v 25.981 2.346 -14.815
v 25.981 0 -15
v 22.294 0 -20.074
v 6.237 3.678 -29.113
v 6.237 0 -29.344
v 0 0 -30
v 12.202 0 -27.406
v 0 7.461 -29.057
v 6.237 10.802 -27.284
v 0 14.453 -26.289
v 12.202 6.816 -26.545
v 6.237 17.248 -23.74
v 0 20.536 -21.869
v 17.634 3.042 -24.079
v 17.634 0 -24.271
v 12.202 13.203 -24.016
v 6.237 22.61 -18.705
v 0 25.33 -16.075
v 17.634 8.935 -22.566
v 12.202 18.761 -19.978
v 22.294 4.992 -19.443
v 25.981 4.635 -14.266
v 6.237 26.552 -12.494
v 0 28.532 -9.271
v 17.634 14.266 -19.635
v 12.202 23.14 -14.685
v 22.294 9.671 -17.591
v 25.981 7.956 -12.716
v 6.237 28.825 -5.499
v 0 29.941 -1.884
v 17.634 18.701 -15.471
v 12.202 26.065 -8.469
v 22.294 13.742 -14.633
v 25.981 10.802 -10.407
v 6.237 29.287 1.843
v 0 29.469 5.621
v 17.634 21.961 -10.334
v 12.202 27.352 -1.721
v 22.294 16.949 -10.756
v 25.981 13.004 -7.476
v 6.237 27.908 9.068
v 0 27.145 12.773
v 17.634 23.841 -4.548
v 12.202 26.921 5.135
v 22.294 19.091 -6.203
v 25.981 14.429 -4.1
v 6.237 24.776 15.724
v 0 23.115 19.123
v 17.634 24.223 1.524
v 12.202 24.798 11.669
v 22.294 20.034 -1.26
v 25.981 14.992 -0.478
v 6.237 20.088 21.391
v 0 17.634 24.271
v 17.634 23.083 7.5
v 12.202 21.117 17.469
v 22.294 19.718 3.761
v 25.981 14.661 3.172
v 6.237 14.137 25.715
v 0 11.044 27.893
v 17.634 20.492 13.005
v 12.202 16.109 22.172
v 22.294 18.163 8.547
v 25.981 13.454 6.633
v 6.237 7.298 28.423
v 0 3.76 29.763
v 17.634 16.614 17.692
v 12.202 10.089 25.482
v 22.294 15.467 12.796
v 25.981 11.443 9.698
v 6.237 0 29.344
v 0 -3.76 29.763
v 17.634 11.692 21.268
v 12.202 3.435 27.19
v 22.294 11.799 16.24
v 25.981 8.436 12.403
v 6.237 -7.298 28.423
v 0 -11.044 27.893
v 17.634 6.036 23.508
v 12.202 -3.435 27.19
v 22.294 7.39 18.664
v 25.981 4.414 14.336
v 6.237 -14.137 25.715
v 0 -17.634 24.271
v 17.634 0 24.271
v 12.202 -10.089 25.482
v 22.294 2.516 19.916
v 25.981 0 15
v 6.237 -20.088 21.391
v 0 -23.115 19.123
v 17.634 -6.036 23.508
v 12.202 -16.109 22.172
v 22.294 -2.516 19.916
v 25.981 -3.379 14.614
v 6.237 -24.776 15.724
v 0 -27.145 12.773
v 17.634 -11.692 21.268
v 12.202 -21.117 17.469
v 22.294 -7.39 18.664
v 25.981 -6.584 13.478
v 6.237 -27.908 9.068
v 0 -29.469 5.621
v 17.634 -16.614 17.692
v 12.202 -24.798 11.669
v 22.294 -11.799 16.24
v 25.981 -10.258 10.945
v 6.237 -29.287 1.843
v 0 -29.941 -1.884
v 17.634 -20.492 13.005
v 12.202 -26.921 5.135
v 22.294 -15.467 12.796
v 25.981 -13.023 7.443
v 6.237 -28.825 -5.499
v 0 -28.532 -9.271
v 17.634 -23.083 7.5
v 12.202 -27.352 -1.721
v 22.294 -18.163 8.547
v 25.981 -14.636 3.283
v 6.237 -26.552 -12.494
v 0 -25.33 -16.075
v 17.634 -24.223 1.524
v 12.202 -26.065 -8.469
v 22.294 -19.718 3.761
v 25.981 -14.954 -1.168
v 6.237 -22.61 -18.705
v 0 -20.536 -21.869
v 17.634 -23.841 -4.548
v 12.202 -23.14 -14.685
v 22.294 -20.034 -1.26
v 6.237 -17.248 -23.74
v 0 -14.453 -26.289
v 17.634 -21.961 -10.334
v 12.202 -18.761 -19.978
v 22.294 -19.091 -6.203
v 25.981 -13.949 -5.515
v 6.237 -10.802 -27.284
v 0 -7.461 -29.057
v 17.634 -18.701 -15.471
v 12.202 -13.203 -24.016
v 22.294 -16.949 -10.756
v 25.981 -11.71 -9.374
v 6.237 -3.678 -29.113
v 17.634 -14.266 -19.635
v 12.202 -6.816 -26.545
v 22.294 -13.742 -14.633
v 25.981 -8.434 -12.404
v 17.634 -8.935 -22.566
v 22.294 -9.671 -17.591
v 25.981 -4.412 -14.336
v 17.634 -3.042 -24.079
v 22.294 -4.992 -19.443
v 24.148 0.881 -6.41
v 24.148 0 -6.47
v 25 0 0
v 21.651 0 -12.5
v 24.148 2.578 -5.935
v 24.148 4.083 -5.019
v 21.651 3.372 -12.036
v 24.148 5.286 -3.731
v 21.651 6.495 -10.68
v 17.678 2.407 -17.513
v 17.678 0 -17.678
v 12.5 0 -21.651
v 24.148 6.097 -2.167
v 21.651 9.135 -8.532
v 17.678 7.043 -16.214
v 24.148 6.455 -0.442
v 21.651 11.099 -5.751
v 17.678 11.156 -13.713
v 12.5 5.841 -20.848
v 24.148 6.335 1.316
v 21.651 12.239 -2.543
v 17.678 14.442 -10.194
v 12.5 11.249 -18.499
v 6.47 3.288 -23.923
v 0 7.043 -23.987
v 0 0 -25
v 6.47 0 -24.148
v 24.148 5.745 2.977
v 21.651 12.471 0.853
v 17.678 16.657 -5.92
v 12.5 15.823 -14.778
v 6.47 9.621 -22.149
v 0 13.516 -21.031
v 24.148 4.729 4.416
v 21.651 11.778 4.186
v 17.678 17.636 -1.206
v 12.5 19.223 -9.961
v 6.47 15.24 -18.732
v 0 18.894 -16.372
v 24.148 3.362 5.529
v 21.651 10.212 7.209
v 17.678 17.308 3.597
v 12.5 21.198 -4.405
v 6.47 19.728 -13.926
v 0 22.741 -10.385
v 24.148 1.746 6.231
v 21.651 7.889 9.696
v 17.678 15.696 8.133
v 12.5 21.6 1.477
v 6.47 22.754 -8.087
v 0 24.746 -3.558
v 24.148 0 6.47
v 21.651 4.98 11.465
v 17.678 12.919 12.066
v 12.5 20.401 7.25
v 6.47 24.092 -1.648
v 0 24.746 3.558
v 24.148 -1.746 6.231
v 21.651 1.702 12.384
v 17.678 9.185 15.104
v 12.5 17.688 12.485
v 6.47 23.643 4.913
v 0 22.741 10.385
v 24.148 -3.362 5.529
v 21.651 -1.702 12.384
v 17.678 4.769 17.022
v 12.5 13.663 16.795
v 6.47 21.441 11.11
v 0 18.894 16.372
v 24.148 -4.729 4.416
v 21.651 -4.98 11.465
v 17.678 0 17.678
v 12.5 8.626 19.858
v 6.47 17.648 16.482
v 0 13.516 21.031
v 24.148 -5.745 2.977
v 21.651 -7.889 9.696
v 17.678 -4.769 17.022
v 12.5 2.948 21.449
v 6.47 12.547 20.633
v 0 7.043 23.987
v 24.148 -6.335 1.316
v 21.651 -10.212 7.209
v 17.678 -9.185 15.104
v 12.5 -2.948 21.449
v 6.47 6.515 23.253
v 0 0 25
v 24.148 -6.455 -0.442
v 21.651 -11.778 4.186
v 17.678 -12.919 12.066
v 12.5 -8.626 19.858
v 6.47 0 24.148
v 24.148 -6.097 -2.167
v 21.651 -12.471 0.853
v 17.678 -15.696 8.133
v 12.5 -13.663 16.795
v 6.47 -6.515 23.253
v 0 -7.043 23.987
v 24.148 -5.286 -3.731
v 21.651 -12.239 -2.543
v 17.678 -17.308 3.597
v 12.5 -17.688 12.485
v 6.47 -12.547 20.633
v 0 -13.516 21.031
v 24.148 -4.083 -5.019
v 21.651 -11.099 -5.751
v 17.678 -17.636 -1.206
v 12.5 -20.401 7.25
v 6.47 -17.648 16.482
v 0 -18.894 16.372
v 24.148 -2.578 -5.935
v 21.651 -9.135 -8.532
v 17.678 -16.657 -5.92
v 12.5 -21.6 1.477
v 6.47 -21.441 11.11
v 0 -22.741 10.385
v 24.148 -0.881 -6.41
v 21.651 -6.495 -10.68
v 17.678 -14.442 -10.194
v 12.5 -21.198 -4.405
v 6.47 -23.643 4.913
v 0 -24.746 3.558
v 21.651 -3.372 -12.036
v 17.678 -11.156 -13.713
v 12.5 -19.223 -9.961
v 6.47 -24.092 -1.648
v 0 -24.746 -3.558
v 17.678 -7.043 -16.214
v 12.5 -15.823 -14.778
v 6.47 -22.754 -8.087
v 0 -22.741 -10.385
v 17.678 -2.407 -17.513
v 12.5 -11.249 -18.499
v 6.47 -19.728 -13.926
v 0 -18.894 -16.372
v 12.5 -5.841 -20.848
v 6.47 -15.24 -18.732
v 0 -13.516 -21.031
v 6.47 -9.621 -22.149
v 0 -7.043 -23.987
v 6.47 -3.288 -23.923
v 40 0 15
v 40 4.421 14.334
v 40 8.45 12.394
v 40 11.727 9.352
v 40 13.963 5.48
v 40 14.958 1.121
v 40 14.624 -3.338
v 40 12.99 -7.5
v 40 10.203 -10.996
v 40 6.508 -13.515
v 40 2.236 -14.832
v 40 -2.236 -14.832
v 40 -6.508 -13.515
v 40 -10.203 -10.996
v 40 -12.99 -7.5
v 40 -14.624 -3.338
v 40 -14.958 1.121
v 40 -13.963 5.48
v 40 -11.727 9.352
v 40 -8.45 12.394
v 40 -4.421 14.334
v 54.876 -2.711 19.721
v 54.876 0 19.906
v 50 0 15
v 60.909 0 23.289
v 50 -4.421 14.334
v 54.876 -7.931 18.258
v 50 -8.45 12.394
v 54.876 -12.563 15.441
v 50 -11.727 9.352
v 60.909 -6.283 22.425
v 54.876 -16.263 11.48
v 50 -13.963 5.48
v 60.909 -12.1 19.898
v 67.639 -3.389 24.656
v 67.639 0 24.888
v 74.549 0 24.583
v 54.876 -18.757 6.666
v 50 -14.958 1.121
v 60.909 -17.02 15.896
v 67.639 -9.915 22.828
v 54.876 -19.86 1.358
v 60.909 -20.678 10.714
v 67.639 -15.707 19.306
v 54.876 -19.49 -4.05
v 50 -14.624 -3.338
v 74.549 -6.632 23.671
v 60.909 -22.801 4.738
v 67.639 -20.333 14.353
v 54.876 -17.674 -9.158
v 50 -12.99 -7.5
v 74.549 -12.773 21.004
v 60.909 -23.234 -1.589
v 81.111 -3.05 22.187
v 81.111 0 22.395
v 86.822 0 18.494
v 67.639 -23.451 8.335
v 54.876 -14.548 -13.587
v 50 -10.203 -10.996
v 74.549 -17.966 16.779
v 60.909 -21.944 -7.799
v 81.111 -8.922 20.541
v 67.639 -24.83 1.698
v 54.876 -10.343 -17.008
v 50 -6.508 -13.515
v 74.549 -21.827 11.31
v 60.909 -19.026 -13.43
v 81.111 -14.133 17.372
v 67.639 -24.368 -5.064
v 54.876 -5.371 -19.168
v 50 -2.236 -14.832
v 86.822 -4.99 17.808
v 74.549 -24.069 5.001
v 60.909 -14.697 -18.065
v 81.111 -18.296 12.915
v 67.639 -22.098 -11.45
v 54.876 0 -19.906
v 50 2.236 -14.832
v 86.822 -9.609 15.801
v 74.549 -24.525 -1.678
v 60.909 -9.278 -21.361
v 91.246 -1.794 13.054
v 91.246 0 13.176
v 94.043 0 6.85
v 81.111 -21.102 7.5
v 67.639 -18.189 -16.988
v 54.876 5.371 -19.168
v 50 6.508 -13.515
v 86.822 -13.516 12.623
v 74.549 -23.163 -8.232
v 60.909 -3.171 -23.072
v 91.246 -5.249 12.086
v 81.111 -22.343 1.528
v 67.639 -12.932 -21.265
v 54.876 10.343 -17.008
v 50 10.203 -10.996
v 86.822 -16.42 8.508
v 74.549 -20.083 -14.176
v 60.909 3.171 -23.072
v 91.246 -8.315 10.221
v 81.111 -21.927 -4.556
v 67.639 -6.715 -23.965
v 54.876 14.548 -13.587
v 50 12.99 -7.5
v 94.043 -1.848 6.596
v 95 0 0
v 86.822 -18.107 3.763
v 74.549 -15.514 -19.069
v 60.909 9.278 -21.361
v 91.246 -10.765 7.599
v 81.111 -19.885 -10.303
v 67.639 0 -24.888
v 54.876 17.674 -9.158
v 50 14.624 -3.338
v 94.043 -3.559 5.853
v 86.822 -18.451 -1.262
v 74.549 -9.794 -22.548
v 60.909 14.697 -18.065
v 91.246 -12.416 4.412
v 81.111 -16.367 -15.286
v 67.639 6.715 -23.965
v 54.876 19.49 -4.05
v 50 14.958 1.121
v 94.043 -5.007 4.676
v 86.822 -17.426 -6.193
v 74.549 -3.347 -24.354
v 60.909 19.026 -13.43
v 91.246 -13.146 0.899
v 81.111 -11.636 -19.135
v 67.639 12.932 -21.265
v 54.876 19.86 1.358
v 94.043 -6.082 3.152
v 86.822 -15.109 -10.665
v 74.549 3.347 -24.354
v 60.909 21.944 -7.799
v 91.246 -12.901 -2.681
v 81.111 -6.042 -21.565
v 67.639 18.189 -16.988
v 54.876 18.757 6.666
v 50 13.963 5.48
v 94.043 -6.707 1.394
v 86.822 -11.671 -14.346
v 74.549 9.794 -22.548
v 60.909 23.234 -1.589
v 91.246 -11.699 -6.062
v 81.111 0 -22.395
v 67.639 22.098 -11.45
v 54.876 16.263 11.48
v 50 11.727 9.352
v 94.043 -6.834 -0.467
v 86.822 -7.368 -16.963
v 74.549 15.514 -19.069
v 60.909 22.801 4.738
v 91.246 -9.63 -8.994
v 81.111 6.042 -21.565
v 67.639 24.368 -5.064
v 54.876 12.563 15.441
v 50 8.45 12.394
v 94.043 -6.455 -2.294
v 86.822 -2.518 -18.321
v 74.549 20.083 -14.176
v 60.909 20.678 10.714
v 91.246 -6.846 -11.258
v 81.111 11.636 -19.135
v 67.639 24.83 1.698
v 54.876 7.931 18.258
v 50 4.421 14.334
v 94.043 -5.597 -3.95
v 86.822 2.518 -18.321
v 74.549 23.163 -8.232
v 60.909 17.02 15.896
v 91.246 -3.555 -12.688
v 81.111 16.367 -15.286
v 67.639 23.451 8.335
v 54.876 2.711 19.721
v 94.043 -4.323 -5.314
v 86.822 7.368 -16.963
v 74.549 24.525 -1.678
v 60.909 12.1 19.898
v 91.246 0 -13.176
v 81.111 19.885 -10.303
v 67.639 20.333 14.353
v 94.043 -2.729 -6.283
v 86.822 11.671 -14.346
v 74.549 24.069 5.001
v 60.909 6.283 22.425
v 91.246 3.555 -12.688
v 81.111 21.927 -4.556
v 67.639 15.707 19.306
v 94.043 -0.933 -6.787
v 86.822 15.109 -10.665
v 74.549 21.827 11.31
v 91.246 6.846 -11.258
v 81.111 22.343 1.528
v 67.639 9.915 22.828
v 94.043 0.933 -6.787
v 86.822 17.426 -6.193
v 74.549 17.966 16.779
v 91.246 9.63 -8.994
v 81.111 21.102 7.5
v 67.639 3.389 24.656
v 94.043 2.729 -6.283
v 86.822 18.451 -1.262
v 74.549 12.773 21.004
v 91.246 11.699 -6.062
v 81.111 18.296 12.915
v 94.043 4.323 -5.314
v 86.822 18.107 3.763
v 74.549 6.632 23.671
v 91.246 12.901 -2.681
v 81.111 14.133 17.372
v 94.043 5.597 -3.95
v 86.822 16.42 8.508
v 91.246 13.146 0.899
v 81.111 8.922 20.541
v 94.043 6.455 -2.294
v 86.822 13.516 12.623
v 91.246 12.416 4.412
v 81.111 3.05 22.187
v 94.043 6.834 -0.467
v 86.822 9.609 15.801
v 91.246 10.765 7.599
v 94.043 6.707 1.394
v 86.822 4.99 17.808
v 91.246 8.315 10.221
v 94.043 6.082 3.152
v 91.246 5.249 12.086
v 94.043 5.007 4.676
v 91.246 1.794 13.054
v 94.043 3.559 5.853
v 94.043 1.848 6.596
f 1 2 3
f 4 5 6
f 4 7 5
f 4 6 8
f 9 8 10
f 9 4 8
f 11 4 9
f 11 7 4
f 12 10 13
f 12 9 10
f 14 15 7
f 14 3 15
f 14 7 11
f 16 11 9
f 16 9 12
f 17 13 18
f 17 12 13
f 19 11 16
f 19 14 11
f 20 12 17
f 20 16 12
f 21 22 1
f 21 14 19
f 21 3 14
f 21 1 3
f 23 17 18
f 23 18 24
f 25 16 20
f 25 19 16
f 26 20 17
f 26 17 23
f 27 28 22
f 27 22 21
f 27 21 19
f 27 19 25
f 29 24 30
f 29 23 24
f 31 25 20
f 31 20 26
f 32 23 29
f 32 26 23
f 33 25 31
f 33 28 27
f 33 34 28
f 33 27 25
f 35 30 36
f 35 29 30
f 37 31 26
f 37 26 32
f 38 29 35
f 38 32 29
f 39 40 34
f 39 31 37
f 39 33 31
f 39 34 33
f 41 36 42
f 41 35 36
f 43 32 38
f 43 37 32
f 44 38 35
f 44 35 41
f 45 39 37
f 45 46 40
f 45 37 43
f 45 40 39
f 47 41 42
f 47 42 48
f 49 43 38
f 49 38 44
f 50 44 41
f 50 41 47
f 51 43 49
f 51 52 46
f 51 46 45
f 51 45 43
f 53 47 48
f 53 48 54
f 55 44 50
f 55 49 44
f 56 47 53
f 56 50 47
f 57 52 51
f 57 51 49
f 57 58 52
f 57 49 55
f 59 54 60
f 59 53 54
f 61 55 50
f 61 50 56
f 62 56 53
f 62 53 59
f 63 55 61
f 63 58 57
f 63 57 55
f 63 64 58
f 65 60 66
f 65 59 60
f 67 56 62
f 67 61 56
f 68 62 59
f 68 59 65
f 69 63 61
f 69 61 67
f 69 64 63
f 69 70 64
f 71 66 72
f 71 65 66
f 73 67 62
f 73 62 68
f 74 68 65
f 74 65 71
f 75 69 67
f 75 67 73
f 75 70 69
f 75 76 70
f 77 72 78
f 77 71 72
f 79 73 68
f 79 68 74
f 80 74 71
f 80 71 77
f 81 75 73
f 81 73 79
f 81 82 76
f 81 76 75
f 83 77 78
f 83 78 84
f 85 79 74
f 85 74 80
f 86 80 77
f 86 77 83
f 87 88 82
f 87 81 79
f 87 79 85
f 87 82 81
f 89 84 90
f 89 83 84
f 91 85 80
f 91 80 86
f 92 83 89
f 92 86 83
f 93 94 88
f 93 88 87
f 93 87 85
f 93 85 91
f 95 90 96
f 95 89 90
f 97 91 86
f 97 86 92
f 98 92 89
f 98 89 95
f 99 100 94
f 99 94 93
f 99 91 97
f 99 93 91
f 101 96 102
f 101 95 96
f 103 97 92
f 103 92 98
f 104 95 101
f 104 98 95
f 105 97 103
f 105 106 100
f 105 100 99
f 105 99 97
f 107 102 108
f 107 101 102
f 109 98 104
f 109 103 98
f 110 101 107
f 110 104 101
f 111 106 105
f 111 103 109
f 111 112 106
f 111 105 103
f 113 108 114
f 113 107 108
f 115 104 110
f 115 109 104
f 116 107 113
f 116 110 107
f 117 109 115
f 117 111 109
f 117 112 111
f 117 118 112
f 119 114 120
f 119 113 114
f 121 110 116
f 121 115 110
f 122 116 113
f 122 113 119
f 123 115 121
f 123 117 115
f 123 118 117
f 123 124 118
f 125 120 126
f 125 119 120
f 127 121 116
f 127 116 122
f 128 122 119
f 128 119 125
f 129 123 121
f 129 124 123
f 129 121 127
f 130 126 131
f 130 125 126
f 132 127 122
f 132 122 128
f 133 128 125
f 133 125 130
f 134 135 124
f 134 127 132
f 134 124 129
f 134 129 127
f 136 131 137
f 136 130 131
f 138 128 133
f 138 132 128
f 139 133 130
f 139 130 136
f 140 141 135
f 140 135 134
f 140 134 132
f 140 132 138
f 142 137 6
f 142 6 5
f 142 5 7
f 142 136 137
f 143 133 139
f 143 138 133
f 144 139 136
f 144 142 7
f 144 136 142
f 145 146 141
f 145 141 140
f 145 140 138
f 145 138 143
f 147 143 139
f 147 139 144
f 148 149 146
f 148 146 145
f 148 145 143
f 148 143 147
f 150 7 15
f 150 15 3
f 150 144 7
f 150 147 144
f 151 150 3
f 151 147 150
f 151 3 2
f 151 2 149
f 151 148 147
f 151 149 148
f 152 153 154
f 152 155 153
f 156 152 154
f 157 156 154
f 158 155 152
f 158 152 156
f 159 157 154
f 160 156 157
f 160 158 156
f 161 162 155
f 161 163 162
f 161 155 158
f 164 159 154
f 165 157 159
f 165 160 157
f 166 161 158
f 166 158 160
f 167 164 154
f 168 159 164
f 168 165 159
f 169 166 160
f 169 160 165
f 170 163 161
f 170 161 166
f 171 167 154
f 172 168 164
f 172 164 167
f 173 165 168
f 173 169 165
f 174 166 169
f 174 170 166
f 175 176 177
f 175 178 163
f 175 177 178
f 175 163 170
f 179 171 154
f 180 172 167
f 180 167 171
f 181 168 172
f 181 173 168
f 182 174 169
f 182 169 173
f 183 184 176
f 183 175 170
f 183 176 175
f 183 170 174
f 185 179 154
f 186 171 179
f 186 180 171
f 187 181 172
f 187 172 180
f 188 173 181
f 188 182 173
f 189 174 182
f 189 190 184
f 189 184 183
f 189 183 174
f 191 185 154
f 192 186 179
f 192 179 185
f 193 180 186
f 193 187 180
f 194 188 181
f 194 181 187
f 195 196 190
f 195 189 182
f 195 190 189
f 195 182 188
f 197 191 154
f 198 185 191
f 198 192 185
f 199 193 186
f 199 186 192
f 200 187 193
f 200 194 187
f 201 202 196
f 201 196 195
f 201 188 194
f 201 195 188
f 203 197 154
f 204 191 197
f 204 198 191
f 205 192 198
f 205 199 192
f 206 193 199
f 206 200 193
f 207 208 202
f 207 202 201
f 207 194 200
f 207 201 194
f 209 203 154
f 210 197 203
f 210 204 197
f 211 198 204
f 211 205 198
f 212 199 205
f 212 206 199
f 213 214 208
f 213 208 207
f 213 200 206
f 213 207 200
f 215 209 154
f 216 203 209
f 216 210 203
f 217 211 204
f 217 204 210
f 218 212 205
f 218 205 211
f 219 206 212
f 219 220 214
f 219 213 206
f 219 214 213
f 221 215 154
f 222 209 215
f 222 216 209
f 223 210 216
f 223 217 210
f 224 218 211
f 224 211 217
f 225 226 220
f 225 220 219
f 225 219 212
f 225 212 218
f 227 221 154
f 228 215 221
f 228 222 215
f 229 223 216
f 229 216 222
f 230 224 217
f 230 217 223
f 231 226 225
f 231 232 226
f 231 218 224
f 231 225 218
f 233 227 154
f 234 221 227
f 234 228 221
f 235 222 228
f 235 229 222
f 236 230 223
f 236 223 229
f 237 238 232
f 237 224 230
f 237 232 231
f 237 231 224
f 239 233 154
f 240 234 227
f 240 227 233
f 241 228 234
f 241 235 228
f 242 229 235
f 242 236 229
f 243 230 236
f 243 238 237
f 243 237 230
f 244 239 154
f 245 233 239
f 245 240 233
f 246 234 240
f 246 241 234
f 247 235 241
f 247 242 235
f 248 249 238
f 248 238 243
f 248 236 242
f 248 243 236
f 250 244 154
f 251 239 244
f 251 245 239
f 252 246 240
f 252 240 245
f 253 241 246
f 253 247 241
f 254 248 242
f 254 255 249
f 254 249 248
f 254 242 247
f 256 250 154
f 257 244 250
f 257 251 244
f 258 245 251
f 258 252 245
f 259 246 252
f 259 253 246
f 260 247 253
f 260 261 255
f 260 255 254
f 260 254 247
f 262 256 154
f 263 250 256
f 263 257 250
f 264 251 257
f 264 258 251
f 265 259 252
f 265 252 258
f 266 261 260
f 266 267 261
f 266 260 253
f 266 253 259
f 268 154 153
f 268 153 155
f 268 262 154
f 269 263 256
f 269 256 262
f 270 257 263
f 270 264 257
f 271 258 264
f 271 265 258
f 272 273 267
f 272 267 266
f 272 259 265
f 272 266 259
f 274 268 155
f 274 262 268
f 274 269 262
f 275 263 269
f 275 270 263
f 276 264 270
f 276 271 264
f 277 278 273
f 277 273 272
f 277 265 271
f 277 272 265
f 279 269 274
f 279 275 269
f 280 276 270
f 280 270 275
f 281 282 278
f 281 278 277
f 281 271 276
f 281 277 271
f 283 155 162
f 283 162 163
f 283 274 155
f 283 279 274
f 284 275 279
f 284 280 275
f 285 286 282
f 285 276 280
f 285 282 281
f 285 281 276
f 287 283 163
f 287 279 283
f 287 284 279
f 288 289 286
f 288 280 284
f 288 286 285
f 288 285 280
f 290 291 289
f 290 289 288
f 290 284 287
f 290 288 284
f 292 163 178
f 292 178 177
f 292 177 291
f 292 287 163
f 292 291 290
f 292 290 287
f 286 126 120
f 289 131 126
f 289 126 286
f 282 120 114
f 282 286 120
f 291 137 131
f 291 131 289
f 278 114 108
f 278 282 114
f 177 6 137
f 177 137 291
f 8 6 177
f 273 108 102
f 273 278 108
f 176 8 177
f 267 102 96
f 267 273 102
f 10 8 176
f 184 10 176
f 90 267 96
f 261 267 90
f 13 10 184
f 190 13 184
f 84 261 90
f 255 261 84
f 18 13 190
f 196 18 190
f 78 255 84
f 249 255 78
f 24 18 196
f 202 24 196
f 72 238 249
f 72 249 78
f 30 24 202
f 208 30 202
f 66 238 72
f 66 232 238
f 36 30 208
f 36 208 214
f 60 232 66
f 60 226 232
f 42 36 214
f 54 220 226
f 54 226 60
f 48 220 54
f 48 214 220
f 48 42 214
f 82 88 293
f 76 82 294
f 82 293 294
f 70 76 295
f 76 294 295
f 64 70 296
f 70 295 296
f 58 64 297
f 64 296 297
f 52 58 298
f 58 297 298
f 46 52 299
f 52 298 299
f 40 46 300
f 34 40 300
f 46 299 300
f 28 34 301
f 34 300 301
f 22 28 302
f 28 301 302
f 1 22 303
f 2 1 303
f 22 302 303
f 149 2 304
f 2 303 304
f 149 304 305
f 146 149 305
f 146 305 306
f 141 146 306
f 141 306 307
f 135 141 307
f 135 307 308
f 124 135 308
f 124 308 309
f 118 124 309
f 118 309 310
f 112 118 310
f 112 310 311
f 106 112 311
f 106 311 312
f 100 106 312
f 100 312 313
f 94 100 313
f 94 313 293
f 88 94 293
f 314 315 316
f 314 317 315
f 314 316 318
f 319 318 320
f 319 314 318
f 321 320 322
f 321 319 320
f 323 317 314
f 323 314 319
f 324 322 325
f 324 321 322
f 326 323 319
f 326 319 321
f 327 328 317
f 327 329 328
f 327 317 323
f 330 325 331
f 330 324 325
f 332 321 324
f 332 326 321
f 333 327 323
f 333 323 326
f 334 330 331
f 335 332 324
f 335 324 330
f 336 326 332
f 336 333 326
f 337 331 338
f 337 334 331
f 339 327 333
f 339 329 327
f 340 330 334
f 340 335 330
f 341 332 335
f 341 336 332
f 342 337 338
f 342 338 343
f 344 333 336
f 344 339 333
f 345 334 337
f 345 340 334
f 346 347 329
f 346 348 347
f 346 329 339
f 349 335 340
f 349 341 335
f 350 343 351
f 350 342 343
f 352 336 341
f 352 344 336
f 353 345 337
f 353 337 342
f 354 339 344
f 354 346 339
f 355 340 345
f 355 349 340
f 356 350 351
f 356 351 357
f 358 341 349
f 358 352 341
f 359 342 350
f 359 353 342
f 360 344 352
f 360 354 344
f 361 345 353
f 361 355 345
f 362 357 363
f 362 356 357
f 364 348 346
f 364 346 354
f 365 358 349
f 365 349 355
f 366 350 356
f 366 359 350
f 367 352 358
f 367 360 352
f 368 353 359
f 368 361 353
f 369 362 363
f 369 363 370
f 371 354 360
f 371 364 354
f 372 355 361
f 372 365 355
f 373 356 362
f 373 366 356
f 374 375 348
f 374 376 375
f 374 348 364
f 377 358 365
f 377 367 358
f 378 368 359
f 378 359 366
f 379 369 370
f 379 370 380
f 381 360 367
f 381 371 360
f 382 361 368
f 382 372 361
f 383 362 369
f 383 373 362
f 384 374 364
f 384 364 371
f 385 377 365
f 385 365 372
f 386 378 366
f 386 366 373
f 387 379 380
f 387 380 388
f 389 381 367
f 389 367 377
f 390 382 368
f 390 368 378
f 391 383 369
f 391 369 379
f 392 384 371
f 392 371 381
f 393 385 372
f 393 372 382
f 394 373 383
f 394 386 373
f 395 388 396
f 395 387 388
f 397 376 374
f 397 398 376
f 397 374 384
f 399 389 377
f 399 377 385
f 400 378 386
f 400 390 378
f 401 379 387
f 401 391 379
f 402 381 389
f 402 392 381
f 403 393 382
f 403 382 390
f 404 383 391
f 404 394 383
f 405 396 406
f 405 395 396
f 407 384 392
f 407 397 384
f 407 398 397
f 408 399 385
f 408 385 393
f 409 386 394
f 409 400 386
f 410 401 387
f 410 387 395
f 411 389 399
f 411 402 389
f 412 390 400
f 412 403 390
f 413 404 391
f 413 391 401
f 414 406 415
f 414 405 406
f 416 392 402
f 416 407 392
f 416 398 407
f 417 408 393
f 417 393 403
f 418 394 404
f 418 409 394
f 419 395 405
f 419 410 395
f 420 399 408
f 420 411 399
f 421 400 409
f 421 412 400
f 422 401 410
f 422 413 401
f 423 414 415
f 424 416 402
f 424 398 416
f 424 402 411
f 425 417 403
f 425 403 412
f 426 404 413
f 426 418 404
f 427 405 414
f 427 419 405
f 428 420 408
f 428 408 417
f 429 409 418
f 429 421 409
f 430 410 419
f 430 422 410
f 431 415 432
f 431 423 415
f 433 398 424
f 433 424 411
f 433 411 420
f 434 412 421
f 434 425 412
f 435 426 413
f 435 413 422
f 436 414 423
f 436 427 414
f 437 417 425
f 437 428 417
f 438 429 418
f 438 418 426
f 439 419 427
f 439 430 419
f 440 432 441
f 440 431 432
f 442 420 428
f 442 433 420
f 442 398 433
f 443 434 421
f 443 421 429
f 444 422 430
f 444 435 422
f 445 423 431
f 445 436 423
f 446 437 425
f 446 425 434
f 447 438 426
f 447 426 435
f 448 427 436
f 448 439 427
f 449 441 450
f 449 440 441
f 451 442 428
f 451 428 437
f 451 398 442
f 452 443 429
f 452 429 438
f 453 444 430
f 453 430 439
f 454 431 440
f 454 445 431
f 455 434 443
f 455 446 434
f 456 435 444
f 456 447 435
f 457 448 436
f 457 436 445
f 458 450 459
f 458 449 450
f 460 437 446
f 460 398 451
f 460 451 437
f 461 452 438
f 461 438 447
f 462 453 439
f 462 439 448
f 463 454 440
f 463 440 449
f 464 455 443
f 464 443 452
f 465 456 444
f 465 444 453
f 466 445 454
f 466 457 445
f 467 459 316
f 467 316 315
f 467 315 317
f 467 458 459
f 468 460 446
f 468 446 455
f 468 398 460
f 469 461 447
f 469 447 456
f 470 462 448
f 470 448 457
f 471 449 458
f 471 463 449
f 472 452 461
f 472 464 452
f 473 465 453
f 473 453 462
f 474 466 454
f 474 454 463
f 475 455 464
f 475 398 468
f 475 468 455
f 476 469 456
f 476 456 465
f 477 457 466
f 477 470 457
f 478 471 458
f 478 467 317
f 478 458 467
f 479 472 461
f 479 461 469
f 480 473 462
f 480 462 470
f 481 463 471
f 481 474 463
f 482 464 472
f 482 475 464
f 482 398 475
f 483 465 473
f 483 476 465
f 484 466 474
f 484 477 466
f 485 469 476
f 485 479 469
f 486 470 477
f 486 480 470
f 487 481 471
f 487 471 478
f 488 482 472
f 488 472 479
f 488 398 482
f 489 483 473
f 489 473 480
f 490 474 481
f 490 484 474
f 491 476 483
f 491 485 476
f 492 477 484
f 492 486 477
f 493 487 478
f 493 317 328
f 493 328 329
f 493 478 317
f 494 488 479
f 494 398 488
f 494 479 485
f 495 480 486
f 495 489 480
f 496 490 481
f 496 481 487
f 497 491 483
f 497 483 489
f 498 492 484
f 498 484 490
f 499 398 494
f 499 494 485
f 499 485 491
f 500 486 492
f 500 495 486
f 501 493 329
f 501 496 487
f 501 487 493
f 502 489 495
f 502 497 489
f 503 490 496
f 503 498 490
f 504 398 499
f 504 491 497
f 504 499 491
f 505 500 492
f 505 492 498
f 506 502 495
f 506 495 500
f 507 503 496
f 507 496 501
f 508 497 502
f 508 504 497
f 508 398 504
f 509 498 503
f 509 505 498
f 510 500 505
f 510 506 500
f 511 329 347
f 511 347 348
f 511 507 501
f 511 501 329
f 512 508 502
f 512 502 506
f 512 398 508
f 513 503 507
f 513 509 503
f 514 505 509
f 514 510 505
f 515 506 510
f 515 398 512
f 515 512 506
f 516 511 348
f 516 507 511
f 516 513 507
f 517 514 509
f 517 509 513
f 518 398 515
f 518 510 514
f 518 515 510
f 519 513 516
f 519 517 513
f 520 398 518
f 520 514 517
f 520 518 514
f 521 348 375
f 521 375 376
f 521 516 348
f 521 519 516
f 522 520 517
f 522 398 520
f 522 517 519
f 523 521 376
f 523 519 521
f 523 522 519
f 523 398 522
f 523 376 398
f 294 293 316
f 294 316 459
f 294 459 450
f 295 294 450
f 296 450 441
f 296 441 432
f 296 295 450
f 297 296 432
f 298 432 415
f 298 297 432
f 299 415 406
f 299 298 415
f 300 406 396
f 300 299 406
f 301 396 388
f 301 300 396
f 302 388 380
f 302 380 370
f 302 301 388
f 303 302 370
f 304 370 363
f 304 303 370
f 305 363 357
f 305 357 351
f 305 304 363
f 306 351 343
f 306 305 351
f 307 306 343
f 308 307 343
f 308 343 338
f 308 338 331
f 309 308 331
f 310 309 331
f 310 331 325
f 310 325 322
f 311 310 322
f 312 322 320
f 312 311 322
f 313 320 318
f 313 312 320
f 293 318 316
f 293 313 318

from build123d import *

# Parameters (mm, degrees)
SALIENTE_EXTRUIR2_START             = -40
CROQUIS2_R                          = 15
SALIENTE_EXTRUIR2_DEPTH             = 10
SALIENTE_EXTRUIR2_DIRECTION_2_REACH = 93.962


with BuildPart() as part:
    # Croquis1 → Revolución-Lámina1 (revolve)
    with BuildSketch(Plane(origin=(0, 0, 0), x_dir=(1, 0, 0), z_dir=(0, 1, 0))):
        with BuildLine():
            ThreePointArc((25, 0), (17.67766953, 17.67766953), (0, 25))
            Line((0, 25), (0, 30))
            ThreePointArc((0, 30), (21.213203436, 21.213203436), (30, 0))
            Line((30, 0), (25, 0))
        make_face()
    revolve(axis=Axis((0, 0, 0), (1, 0, 0)))

    # Croquis2 → Saliente-Extruir2 (add)
    with BuildSketch(Plane.ZY.offset(SALIENTE_EXTRUIR2_START)):
        Circle(CROQUIS2_R)
    extrude(amount=-SALIENTE_EXTRUIR2_DEPTH)

    # Croquis2 → Saliente-Extruir2 direction 2 (add, up to next)
    with BuildSketch(Plane.ZY.offset(SALIENTE_EXTRUIR2_START), mode=Mode.PRIVATE) as saliente_extruir2_direction_2_sk1:
        Circle(CROQUIS2_R)
    saliente_extruir2_direction_2_tool1 = extrude(saliente_extruir2_direction_2_sk1.sketch, amount=SALIENTE_EXTRUIR2_DIRECTION_2_REACH, mode=Mode.PRIVATE) - part.part
    add(saliente_extruir2_direction_2_tool1.solids().sort_by_distance((40, 0, 0))[0])

    # Croquis3 → Revolución1 (revolve)
    with BuildSketch(Plane.XY, mode=Mode.PRIVATE) as revoluci_n1_sk:
        with BuildLine():
            Line((50, 0), (50, 15))
            ThreePointArc((50, 15), (77.90569415, 23.717082451), (95, 0))
            Line((95, 0), (50, 0))
        make_face()
    revolve(revoluci_n1_sk.sketch.rotate(Axis((50, 0, 0), (1, 0, 0)), 90), axis=Axis((50, 0, 0), (1, 0, 0)))


solid = part.part
